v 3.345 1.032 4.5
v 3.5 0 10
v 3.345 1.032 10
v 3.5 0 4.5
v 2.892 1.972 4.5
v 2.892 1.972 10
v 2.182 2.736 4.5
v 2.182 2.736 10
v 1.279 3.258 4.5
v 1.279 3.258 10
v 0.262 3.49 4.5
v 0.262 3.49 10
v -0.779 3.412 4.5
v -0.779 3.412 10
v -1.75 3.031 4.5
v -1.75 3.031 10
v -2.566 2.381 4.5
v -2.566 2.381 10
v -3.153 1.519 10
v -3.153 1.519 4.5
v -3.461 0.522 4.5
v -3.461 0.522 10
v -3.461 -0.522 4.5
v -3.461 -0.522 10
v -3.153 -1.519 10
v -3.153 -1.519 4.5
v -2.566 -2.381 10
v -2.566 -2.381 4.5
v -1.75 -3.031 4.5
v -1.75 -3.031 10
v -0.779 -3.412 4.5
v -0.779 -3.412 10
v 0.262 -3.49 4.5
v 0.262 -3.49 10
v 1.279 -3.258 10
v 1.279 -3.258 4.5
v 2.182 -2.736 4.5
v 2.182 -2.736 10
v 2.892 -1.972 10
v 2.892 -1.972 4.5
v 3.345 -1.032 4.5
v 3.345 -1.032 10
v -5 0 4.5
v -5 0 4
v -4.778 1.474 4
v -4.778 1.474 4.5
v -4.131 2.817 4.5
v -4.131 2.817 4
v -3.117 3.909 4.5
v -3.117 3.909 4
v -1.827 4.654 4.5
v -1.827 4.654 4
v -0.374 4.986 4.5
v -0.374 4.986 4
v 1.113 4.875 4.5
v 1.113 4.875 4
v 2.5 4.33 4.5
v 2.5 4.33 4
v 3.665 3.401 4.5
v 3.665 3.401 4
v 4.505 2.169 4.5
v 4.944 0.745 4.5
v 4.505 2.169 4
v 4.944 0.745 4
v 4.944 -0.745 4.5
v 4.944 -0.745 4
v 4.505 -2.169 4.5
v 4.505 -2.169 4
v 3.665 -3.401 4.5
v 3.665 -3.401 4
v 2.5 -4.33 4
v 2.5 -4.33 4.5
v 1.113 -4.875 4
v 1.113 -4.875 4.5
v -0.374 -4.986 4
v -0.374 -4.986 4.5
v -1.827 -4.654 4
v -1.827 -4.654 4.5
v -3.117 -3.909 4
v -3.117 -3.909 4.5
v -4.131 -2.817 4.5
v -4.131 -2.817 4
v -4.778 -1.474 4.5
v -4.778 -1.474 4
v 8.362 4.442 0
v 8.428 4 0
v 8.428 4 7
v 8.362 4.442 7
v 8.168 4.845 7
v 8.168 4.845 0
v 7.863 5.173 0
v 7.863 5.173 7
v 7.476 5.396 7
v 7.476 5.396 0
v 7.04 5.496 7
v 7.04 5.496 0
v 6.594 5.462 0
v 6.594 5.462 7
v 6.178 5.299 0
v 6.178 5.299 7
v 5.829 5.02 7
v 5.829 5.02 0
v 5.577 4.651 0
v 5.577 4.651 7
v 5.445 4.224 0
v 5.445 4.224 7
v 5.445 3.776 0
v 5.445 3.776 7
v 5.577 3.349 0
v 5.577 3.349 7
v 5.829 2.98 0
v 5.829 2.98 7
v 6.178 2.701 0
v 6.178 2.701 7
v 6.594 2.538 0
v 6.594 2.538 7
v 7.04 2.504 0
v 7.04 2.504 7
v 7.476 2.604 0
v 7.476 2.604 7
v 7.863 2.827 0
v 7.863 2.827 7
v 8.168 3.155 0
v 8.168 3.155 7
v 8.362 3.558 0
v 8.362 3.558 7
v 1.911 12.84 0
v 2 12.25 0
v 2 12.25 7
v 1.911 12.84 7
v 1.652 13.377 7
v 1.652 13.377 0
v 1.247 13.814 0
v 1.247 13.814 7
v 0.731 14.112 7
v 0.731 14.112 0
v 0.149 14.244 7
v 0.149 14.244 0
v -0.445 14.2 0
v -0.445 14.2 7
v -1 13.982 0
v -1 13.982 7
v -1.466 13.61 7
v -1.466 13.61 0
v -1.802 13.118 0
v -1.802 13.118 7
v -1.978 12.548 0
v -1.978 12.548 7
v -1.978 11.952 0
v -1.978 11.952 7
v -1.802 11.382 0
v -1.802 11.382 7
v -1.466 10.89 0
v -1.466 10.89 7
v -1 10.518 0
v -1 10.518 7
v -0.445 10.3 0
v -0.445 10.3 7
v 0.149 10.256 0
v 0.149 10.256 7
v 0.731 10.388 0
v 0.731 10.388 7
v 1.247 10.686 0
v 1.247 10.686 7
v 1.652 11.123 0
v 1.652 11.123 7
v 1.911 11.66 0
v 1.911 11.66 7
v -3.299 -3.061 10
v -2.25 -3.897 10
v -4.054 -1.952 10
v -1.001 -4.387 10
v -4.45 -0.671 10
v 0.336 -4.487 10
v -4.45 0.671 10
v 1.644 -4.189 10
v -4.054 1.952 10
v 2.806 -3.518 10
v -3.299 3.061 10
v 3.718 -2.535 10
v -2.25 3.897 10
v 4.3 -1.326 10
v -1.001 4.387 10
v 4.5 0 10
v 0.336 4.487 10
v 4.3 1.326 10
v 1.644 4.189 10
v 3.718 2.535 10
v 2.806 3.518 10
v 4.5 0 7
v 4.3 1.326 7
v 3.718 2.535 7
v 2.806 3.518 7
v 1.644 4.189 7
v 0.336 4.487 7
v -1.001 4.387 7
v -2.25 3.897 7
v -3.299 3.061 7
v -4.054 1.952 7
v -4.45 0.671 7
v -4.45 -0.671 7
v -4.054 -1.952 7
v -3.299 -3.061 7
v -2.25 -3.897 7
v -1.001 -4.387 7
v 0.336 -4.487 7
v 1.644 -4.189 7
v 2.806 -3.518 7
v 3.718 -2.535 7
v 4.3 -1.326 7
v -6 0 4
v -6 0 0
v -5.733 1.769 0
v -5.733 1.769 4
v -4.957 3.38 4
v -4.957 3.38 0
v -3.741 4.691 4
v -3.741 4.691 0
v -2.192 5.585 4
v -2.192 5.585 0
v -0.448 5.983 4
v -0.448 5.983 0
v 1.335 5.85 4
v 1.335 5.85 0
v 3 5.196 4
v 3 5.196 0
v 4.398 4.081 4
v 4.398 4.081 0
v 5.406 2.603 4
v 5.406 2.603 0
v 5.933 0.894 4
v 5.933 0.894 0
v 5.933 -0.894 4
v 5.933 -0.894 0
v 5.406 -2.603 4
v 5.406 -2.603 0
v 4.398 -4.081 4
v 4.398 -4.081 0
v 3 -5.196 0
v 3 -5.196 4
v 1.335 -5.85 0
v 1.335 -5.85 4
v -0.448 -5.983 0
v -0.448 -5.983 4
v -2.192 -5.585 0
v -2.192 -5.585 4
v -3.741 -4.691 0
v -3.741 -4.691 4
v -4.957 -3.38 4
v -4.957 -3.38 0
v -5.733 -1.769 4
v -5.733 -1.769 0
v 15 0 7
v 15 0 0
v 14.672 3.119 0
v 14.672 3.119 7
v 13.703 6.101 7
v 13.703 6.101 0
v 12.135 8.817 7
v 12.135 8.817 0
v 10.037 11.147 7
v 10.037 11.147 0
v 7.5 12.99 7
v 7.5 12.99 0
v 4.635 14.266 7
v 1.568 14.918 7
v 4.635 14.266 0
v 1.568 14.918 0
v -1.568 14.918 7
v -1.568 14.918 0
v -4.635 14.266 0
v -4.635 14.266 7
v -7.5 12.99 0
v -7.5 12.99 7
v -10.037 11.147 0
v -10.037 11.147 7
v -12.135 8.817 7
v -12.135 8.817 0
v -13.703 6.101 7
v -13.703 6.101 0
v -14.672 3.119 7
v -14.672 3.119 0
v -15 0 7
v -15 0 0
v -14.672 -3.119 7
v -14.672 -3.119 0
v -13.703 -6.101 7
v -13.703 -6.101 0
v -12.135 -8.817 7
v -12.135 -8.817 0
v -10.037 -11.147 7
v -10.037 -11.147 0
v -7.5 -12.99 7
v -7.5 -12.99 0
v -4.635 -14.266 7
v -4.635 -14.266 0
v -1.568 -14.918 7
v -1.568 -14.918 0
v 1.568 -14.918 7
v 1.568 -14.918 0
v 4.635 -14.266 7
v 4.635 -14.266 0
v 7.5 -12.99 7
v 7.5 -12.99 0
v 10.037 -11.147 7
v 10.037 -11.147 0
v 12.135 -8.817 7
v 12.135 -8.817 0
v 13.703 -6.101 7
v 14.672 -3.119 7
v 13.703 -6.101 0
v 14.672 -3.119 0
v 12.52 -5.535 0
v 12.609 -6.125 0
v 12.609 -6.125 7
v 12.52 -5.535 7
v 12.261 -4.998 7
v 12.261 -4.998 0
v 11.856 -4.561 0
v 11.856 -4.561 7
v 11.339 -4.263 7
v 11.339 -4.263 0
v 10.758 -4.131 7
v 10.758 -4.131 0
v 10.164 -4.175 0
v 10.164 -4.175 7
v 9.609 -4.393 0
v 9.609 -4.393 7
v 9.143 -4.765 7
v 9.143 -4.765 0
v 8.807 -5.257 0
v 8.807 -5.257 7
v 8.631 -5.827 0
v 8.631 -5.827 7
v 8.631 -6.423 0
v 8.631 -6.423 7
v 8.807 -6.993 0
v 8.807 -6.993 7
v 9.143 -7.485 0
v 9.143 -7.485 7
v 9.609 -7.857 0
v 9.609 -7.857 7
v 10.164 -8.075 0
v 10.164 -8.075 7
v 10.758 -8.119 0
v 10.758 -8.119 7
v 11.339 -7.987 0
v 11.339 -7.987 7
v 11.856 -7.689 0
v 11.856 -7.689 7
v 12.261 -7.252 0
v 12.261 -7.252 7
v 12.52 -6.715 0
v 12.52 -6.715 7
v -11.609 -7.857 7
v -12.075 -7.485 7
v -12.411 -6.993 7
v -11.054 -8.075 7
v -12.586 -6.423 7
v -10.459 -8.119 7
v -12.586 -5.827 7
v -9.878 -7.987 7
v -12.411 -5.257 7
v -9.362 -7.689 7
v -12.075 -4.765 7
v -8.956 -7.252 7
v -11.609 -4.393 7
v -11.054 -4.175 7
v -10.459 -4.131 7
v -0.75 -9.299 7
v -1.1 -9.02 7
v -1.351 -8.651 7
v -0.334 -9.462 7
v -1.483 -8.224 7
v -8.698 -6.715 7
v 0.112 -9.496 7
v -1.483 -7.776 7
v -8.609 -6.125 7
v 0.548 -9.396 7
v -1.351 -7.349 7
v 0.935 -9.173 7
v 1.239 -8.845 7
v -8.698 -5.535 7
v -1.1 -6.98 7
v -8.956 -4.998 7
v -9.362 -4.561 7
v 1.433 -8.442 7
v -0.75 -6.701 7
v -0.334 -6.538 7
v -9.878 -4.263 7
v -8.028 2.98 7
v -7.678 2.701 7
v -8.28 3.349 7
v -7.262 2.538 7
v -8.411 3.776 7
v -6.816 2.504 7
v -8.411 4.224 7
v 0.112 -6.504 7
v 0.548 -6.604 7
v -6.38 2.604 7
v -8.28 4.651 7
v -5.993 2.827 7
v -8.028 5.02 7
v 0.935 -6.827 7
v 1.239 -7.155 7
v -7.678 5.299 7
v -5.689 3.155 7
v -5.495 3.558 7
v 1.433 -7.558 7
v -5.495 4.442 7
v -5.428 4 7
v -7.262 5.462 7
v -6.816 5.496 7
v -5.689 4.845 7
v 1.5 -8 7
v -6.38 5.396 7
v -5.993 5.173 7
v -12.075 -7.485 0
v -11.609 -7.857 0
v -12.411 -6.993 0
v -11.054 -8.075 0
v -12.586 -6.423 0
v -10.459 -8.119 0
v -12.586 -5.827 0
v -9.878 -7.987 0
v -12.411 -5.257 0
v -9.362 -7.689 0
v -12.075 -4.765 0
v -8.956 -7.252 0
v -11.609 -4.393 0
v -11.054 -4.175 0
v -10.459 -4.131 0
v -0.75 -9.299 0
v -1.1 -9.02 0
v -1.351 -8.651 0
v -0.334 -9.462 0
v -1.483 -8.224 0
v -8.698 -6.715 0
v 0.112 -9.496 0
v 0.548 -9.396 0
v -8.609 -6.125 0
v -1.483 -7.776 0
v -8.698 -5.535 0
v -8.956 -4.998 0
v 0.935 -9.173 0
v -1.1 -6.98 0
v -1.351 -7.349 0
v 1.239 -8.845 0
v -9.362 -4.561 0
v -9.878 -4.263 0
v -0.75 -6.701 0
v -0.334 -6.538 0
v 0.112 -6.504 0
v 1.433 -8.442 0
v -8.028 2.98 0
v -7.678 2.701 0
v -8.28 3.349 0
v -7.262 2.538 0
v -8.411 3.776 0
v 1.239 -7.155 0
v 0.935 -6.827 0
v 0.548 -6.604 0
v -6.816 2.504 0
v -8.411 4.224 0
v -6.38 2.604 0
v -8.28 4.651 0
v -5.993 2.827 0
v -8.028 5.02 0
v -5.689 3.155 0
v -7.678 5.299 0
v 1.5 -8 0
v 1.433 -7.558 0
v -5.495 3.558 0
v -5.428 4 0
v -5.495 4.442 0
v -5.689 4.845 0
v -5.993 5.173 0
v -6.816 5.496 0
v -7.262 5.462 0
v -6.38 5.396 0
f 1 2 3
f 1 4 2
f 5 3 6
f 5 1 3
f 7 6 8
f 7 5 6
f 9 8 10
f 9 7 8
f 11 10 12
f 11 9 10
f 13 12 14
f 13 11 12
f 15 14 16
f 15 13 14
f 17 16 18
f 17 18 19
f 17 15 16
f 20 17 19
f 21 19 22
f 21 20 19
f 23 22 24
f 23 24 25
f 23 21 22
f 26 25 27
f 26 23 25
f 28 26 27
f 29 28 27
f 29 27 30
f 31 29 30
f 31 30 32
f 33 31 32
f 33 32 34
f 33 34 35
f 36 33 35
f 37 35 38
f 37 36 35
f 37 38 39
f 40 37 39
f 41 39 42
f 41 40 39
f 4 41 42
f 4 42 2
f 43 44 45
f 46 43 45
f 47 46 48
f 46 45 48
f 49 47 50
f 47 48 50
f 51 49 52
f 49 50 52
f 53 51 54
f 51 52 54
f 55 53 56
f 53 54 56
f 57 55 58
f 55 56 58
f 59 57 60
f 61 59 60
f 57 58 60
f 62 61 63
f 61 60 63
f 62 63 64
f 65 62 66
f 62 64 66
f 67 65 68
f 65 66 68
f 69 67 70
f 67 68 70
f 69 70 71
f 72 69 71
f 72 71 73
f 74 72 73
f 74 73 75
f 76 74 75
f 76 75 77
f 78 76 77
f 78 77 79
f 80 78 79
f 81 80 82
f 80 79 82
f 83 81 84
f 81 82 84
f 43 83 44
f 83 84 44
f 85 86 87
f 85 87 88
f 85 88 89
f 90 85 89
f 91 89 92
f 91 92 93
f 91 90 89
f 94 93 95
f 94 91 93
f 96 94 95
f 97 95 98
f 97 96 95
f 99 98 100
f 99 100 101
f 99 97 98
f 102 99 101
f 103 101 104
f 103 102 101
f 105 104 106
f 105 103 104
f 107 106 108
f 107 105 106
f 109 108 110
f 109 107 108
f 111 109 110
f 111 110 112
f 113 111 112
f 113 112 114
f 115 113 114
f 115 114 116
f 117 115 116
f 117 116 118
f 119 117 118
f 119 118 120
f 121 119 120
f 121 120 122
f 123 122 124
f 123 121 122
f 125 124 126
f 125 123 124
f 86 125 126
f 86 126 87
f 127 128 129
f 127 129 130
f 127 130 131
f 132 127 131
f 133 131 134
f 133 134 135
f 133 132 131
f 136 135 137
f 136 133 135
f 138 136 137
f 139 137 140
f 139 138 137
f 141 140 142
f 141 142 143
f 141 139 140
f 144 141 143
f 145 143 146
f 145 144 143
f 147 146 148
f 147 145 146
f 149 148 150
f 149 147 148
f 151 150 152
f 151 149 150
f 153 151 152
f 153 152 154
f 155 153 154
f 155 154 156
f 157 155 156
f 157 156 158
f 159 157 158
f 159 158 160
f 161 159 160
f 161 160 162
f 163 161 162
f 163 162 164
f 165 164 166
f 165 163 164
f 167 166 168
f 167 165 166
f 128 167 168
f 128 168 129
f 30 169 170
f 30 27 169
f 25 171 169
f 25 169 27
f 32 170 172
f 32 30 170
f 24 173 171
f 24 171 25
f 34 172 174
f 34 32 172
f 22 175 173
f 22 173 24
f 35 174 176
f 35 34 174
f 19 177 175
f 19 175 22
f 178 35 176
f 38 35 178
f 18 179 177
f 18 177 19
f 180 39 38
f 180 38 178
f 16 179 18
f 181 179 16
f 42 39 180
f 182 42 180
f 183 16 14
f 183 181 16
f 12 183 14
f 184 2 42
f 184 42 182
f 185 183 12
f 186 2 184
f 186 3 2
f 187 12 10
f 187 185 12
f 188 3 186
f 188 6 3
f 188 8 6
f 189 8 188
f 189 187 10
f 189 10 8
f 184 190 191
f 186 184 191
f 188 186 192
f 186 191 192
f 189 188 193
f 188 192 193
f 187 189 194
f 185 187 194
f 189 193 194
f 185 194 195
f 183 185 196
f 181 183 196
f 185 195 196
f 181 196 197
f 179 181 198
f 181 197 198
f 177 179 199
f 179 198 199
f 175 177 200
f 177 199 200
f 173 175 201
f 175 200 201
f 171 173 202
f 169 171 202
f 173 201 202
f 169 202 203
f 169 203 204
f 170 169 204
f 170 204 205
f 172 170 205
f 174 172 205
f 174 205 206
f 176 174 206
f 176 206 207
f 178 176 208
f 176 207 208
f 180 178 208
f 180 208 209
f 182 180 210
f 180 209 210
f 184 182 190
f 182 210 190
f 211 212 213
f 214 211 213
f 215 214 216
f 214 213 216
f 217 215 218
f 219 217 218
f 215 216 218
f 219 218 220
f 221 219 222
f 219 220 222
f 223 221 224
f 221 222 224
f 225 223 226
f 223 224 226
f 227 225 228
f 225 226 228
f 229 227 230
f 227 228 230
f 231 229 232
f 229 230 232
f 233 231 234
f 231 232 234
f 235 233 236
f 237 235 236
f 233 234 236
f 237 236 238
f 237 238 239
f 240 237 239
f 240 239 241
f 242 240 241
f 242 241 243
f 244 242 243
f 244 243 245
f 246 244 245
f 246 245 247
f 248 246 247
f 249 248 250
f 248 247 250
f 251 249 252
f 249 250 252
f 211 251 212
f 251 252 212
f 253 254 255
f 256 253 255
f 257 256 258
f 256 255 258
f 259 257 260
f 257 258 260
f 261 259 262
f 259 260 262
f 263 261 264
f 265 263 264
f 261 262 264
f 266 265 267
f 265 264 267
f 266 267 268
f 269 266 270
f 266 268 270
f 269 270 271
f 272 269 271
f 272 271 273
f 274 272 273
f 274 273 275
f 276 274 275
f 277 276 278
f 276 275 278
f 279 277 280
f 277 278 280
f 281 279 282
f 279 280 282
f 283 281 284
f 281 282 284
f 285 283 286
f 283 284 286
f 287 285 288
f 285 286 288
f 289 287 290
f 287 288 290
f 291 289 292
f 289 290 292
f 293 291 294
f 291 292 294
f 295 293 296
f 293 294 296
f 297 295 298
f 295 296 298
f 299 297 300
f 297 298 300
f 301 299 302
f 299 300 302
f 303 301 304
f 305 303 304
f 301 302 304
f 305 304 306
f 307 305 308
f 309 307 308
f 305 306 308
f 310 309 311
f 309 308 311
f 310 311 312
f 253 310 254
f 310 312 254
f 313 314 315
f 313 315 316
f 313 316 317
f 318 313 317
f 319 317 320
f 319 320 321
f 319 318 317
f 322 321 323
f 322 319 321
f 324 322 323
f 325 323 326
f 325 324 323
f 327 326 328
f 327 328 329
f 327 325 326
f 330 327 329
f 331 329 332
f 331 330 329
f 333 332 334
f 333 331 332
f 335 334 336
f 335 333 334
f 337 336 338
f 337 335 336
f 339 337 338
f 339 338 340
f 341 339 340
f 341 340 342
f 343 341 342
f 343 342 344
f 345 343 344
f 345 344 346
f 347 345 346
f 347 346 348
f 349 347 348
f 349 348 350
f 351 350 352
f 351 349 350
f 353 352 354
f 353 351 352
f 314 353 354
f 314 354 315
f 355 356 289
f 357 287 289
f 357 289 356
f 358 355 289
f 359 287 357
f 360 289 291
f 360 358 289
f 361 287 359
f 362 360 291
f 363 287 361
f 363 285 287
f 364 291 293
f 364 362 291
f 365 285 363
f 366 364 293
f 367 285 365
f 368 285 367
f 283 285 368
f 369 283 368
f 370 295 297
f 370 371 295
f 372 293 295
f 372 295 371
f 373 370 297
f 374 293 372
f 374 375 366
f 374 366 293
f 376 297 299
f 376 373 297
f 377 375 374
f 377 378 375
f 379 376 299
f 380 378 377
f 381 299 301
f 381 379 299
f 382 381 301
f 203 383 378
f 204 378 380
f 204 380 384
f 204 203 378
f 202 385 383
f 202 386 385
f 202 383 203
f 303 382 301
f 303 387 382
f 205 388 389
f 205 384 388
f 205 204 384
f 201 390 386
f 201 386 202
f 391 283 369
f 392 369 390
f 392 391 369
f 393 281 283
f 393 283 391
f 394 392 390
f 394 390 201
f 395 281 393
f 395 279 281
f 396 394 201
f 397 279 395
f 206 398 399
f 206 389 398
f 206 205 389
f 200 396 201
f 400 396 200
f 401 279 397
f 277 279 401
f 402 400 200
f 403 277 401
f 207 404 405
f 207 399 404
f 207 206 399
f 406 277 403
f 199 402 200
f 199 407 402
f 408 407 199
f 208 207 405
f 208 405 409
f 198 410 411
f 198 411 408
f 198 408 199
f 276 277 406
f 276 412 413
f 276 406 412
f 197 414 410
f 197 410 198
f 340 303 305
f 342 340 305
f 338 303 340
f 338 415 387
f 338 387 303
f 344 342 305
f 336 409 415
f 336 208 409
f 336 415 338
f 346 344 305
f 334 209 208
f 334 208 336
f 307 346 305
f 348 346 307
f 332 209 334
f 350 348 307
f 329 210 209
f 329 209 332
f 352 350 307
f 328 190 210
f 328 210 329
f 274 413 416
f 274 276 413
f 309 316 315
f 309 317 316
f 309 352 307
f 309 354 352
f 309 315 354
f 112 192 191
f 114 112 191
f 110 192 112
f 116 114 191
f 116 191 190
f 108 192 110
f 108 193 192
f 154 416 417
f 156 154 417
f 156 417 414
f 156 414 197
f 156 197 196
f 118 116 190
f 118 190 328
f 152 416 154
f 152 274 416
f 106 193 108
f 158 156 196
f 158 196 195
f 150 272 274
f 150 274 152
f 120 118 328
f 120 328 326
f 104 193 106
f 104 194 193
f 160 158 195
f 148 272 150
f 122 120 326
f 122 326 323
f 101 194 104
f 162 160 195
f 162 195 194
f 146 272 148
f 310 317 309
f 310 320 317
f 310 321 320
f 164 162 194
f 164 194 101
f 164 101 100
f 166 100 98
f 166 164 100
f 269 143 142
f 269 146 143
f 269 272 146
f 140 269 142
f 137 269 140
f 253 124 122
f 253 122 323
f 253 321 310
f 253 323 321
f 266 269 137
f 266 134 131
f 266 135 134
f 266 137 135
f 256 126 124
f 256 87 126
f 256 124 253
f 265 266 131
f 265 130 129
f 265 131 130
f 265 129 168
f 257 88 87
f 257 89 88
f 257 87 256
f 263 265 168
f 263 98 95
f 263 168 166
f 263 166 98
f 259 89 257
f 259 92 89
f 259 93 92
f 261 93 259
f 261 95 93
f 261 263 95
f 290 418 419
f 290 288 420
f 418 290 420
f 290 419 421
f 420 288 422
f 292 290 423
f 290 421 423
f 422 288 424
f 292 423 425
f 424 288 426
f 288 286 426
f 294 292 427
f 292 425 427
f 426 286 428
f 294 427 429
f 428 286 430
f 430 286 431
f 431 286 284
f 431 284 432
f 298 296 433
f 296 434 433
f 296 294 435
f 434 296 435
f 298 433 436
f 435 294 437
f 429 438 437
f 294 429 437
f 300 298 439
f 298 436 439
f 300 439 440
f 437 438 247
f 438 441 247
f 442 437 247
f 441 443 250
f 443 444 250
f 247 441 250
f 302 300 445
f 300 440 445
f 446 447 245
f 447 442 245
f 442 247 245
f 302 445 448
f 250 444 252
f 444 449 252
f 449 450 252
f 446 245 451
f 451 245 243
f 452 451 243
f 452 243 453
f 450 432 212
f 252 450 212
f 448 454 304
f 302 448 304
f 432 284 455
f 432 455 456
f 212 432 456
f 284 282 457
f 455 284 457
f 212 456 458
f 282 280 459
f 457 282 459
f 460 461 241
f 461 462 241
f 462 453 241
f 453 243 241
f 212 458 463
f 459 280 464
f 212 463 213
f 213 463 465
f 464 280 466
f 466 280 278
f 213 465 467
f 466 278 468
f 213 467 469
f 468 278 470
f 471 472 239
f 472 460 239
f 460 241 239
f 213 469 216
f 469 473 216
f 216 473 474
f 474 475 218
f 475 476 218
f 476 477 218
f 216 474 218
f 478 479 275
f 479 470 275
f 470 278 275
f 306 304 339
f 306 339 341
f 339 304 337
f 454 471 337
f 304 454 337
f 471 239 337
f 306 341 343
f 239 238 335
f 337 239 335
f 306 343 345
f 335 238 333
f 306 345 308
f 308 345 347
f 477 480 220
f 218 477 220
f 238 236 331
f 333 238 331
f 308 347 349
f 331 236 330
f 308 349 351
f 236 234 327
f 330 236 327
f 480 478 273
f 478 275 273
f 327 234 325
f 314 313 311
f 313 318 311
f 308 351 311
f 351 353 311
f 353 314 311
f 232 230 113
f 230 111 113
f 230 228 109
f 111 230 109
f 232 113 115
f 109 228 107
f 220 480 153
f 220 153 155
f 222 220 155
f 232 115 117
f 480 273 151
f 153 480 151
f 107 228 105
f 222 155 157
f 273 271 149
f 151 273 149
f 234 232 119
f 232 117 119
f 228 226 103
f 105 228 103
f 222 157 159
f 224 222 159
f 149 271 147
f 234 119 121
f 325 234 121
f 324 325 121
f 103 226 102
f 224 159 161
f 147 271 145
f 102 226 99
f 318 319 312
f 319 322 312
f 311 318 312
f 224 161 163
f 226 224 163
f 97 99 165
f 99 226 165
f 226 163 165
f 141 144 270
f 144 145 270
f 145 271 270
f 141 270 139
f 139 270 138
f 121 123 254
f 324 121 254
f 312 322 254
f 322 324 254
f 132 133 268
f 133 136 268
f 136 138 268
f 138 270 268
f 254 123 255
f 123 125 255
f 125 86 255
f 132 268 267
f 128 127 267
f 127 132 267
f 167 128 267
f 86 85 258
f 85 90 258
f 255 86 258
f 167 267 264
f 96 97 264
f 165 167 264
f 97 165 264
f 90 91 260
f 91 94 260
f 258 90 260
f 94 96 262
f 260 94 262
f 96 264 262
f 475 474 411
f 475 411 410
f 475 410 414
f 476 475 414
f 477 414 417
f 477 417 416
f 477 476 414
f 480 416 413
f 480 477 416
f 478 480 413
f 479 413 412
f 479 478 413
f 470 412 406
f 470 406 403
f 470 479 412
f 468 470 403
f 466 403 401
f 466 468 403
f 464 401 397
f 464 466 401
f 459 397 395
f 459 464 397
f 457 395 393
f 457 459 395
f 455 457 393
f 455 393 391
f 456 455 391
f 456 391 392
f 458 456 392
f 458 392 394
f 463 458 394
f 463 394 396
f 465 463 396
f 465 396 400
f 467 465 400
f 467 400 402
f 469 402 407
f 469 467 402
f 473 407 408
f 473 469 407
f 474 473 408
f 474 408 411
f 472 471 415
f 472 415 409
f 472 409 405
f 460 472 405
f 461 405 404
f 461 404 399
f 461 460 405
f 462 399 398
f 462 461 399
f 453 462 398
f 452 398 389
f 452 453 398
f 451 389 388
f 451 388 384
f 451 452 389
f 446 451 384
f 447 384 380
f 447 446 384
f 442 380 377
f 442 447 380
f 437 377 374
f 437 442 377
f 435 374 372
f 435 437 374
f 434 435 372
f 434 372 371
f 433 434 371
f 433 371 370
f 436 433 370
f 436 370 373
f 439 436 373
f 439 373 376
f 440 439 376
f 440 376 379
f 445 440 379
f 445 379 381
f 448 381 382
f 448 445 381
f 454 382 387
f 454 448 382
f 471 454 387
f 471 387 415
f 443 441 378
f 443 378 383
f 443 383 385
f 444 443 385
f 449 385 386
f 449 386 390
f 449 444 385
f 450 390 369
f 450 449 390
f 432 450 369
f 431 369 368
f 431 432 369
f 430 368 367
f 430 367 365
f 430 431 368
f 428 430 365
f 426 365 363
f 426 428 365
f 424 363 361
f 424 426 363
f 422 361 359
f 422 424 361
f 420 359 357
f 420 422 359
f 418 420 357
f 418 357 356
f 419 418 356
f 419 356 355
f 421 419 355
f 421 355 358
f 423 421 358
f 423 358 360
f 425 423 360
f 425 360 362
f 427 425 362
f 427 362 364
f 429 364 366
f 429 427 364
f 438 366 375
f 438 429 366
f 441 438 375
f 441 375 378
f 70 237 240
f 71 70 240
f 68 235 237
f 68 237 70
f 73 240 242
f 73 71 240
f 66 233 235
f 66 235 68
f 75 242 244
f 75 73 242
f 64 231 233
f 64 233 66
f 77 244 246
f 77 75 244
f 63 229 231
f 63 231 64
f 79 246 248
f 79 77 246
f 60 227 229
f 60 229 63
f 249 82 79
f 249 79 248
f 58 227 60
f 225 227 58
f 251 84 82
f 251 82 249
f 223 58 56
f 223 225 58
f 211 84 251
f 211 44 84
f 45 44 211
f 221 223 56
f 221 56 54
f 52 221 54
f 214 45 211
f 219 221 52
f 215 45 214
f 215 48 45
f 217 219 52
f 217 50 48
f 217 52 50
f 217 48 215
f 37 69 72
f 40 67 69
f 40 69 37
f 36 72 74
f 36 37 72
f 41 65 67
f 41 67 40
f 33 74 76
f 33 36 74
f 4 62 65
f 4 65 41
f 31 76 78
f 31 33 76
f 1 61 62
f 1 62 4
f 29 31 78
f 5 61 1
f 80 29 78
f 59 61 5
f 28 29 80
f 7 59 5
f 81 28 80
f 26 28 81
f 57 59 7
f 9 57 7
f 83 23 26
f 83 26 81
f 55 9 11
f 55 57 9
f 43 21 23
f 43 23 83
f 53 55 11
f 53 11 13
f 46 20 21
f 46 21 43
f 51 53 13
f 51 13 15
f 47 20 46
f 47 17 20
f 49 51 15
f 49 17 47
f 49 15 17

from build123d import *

# Parameters (mm, degrees)
ESQUISSE1_R      = 15
ESQUISSE1_R_2    = 3.5
ESQUISSE1_R_3    = 2
ESQUISSE1_R_4    = 1.5
EXTRUSION1_DEPTH = 7
ESQUISSE2_R      = 4.5
ESQUISSE2_R_2    = 3.5
EXTRUSION2_DEPTH = 3
ESQUISSE3_R      = 6
EXTRUSION3_DEPTH = 4
ESQUISSE4_R      = 5
ESQUISSE4_R_2    = 3.5
EXTRUSION4_DEPTH = 0.5


with BuildPart() as part:
    # Esquisse1 → Extrusion1 (new body)
    with BuildSketch(Plane.XY):
        Circle(ESQUISSE1_R)
        Circle(ESQUISSE1_R_2, mode=Mode.SUBTRACT)
        with Locations((10.608811196, -6.125)):
            Circle(ESQUISSE1_R_3, mode=Mode.SUBTRACT)
        with Locations((0, 12.25)):
            Circle(ESQUISSE1_R_3, mode=Mode.SUBTRACT)
        with Locations((-10.608811196, -6.125)):
            Circle(ESQUISSE1_R_3, mode=Mode.SUBTRACT)
        with Locations((-6.92820323, 4)):
            Circle(ESQUISSE1_R_4, mode=Mode.SUBTRACT)
        with Locations((6.92820323, 4)):
            Circle(ESQUISSE1_R_4, mode=Mode.SUBTRACT)
        with Locations((0, -8)):
            Circle(ESQUISSE1_R_4, mode=Mode.SUBTRACT)
    extrude(amount=EXTRUSION1_DEPTH)

    # Esquisse2 → Extrusion2 (add)
    with BuildSketch(Plane.XY.offset(7)):
        Circle(ESQUISSE2_R)
        Circle(ESQUISSE2_R_2, mode=Mode.SUBTRACT)
    extrude(amount=EXTRUSION2_DEPTH)

    # Esquisse3 → Extrusion3 (cut)
    with BuildSketch(Plane(origin=(0, 0, 0), x_dir=(-1, 0, 0), z_dir=(0, 0, -1))):
        Circle(ESQUISSE3_R)
    extrude(amount=-EXTRUSION3_DEPTH, mode=Mode.SUBTRACT)

    # Esquisse4 → Extrusion4 (cut)
    with BuildSketch(Plane(origin=(0, 0, 4), x_dir=(-1, 0, 0), z_dir=(0, 0, -1))):
        Circle(ESQUISSE4_R)
        Circle(ESQUISSE4_R_2, mode=Mode.SUBTRACT)
    extrude(amount=-EXTRUSION4_DEPTH, mode=Mode.SUBTRACT)


solid = part.part
